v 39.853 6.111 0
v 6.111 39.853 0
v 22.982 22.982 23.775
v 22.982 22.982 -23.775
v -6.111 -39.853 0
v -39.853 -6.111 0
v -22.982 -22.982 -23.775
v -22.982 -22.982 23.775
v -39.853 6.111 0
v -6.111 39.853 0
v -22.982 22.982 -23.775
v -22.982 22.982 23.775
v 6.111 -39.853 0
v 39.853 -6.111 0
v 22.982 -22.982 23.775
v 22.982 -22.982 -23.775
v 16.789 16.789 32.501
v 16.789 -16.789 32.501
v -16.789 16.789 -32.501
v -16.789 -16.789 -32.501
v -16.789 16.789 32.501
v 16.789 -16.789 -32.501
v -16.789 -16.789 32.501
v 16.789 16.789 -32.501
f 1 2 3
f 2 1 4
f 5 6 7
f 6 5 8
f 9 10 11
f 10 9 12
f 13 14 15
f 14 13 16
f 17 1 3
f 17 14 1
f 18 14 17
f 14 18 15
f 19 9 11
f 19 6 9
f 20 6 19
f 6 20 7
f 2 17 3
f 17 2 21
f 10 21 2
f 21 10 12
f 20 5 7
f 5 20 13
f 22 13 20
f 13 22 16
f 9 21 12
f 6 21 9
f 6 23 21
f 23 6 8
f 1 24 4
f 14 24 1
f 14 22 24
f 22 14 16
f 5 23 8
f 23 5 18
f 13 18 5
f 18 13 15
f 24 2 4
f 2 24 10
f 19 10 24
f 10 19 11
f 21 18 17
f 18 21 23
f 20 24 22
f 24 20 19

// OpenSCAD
// file: triangle.scad
function triangle_edge_length(edge_length, depth) =
    edge_length - 2*sqrt(3)*depth;

module triangle(edge_length, depth, thickness) {
    e_top = triangle_edge_length(edge_length, depth);
    r_top = e_top/sqrt(3);
    r_bottom = r_top + thickness * sqrt(3)/2;
    rotate(90)
    for (z=[0,1]) mirror([0,0,z])
    linear_extrude(thickness/2, scale=r_top/r_bottom)
    circle(r=r_bottom, $fn=3);
}
// file: hinge.scad
$fn = 40;

hinge_gap = 0.3;
hinge_hole_d = 2.6;
hinge_rod_d = 1.8;

module hinge_hole_piece(width, depth, thickness) {
    h = width - hinge_gap;
    difference() {
        hinge_rod_piece(width, depth, thickness);
        rotate([0,90,0])
        cylinder(d=hinge_hole_d, h=width+1, center=true);
    }
}

module hinge_rod_piece(width, depth, thickness) {
    h = width - hinge_gap;
    rotate([0,90,0]) {
        cylinder(d=thickness, h=h, center=true);
        translate([-thickness/2,0,-h/2])
        cube([thickness, depth, h]);
    }
}

module hinge_rod(width) {
    h = width - hinge_gap;
    rotate([0,90,0])
    cylinder(d=hinge_rod_d, h=h, center=true);
}

module hinge(width, depth, thickness, n) {
    unit_width = width/n;
    shift = width/2 - unit_width/2;
    for (i=[0:2:n-1]) {
        translate([i*unit_width - shift,0,0])
        hinge_rod_piece(unit_width, depth, thickness);
    }
    for (i=[1:2:n-1]) {
        translate([i*unit_width - shift,0,0])
        rotate(180)
        hinge_hole_piece(unit_width, depth, thickness);
    }
    hinge_rod(width);
}

intersection() {
    translate([0,0,-100])
    cube(200, center=true);
    union() {
        for (y=[-8,8]) translate([0,y,0])
        cube([30, 5, 4], center=true);
        hinge(30, 6, 4, 6);
    }
}
// file: magnet.scad
magnet_width = 5;
magnet_height = 2.5;
magnet_depth = 1.5;
magnet_gap = .4;
magnet_wall = .8;
magnet_cover = .7;

module magnet_hole(p, q, thickness) {
    x = (q-p) / norm(q-p);
    y = [-x[1], x[0]];
    a = -90 + atan2(-x[0], x[1]);
    v = (p+q) / 2;
    width = magnet_width + magnet_gap + 2*magnet_wall;
    depth = magnet_depth + magnet_gap + magnet_wall;
    height = magnet_height + magnet_gap + magnet_cover;
    translate(v)
    rotate(a)
    translate([-width/2, 0.8,  thickness - height + 0.01])
    cube([width, depth, height]);
}

module magnet_holder() {
    width = magnet_width + magnet_gap + 2*magnet_wall;
    depth = magnet_depth + magnet_gap + magnet_wall;
    height = magnet_height + magnet_gap + magnet_cover;
    difference() {
        cube([width, depth, height-.2]);
        translate([magnet_wall, -0.01, magnet_cover])
        cube([width-2*magnet_wall, depth-magnet_wall, height]);
        translate([0,0,5/sqrt(2)+height/2])
        rotate([45,0,0])
        cube([100,5,5], center=true);
    }
}

module magnet_cut_outs(edges, thickness) {
    difference() {
        children();
        translate([0,0,-thickness/2])
        for (edge=edges) magnet_hole(edge[0], edge[1], thickness);
    }
}

/*
A = [-20, 0];
B = [10, 10];
C = [0, -10];
magnet_cut_outs([[A,B],[B,C],[C,A]],4)
linear_extrude(4)
polygon([A, B, C]);
*/

for (x=[1:2])
for (y=[1:6])
translate([10*x,-y*5,0])
magnet_holder();
// file: geometry.scad
module cut_through(a_2d, b_2d) {
    v = b_2d - a_2d;
    intersection() {
        translate(a_2d)
        rotate(atan2(-v[0], v[1]))
        translate([100,0,0])
        cube([200,200,10], center=true);
        children();
    }
}

function along(p, q, ratio) = p + ratio * (q-p);

function triangle_points(edge_length) = 
    let(a = edge_length/2, rho = edge_length*sqrt(3)/6) 
    [[-a,-rho], [a,-rho], [0,2*rho]];

function line_line(a,b, p,q) = 
    along(a, b, cross(a-p,p-q)/cross(a-b,p-q));
// file: hinged_triangle.scad
use <hinge.scad>
use <triangle.scad>

module hinged_triangle(
    edge_length, depth, thickness, hinge_n, flip) {
    for (i=[0,1,2]) {
        rotate(120*i)
        translate([0, -edge_length*sqrt(3)/6, 0])
        rotate(180*flip)
        hinge(
            width=triangle_edge_length(edge_length=edge_length, depth=depth), 
            depth=depth, 
            thickness=thickness, 
            n=hinge_n);
    }
    triangle(
        edge_length=edge_length, 
        depth=depth, 
        thickness=thickness);
}
// file: dovetail.scad
dovetail_tension = 0.08;
dovetail_shape = 0.4;
dovetail_depth = 3;
dovetail_lower_cover = 0.4;
dovetail_upper_cover = 0.6;

function shift(pt, vec) = [for (p = vec) p + pt];

function zig(start_x, width) =
    let(
        a = width/4, 
        d = -dovetail_depth,
        s = dovetail_depth * dovetail_shape / 2
    )
    shift(
        [start_x, dovetail_tension],
        [[0,0],[a+s, 0],[a-s, d],[3*a+s, d],[3*a-s, 0]]
    );

function zag(start_x, width) =
    let(
        a = width/4, 
        d = -dovetail_depth,
        s = dovetail_depth * dovetail_shape / 2
    )
    shift(
        [start_x, dovetail_tension],
        [[0,d],[a+s, d],[a-s, 0],[3*a+s, 0],[3*a-s, d]]
    );

function zigzag(start_x, width, zig_or_zag) =
    zig_or_zag ? zig(start_x, width) : zag(start_x, width);

module dovetail(width, n, thickness, zig_or_zag) {
    h = thickness - dovetail_upper_cover;
    unit = width / n;
    translate([-width/2, dovetail_depth/2, -thickness/2]) {
        linear_extrude(h)
        polygon(
            [for (i=[0:n-1]) 
                each(zigzag(unit*i, unit, zig_or_zag)),
             [width, 0], [width, width], [0,width]]);
        translate([0, -dovetail_depth, -10])
        cube([width, width + dovetail_depth, dovetail_lower_cover + 10]);
        translate([0,0,h])
        cube([width, width, dovetail_upper_cover + 10]);
    }
}

intersection_for (y=[0,1]) mirror([0,y,0])
translate([0,8,0])
rotate([180,0,0])
dovetail(100, 10, 4);
// main file
use <dovetail.scad>
use <hinged_triangle.scad>
use <geometry.scad>
use <magnet.scad>

$fn = 40;

thickness = 4;
depth = 5;
edge_length = 85;

dovetail_n = 24;
hinge_n = 12;

assert(dovetail_n%4==0);

pts = triangle_points(edge_length);

module face() {
    intersection() {
        hinged_triangle(
            edge_length=edge_length, 
            depth=depth, 
            thickness=thickness,
            hinge_n=hinge_n,
            flip=0);
        linear_extrude(2*thickness, center=true) polygon(pts);
    }
}

module outer_face() {
    intersection() {
        hinged_triangle(
            edge_length=edge_length, 
            depth=depth, 
            thickness=thickness,
            hinge_n=hinge_n,
            flip=1);
        linear_extrude(2*thickness, center=true) polygon(pts);
    }
}

/*
Ear and slot

module ear(p) {
    union() {
        translate(p) {
            cylinder(d1=8,d2=6,h=w/2);
            mirror([0,0,1])
            cylinder(d1=8,d2=6,h=w/2);
        }
        children();
    }
}

module slot(p) {
    difference() {
        children();
        translate(p) {
            translate([0,0,-0.01])
            cylinder(d1=8.1,d2=6.1,h=w/2+.05);
            mirror([0,0,1])
            translate([0,0,-0.01])
            cylinder(d1=8.1,d2=6.1,h=w/2+0.05);
        }
    }
}

module left(dir, ear_or_slot) {
    conn(a,b,dir)
    conn(e,a,1-dir)
    intersection() {
        edge(a,b,45);
        if (ear_or_slot) {
            ear((2*b+e)/3+[1.6,0,0])
            edge(b,e,0,0.05);
        } else {
            slot((2*b+e)/3-[1.6,0,0])
            edge(b,e,0,0.05);
        }
        edge(e,a,45);
        cube([200,200,w],center=true);
    }
}
module right(dir, ear_or_slot) {
    mirror([1,0,0]) left(dir, ear_or_slot);
}


*/

module faces() {
    face();
    for (a=[120:120:360])
        rotate(a)
        translate([0,-edge_length*sqrt(3)/3,0])
        rotate(180)
        outer_face();
}

module inner_dovetail_piece() {
    translate([0, 2+depth-edge_length*sqrt(3)/6, 0])
    dovetail(
        width=2*edge_length, 
        n=dovetail_n, 
        thickness=thickness,
        zig_or_zag=true);
}

module outer_dovetail_piece(zig_or_zag) {
    translate([0, -edge_length*sqrt(3)/6, 0])
    intersection_for(y=[0,1])
        mirror([0,y,0])
        translate([0, 2+depth, 0])
        rotate([180,0,0])
        dovetail(
            width=2*edge_length, 
            n=dovetail_n, 
            thickness=thickness,
            zig_or_zag=zig_or_zag);
}

module all_inner_dovetails() {
    intersection_for(a=[120:120:360]) 
        rotate(a) inner_dovetail_piece();
}

module all_outer_dovetails() {
    for(a=[120:120:360])
        rotate(a) {
            translate([0,edge_length*sqrt(3)/2,0])
            outer_dovetail_piece(zig_or_zag=false);
            outer_dovetail_piece(zig_or_zag=false);
        }
}

module inner() {
    intersection() {
        all_inner_dovetails();
        children();
    }
    // Magnet size: 5x2.5x1.5
}

module outer() {
    intersection() {
        all_outer_dovetails();
        children();
    }
}

A = pts[0];
B = pts[1];
C = pts[2];
F = along(A,B,.5);
G = along(B,C,1/3);
H = along(B,C,2/3);
E = along(A,C,.5);

W = A+(B-C);
T = B+(C-A);
Y = along(C,T,-.5);
I = along(C,T,.5);
X = along(B,T,.5);
J = along(B,W,.5);
U = along(A,W,1/3);
V = along(A,W,2/3);
Z = along(A,W,-1/3);

S = line_line(B,I, F,T);
N = line_line(C,X, A,H);
K = line_line(C,F, A,H);
M = line_line(B,E, F,G);
Q = line_line(F,G, A,J);
R = line_line(B,V, A,J);
L = line_line(A,Y, C,Z);

TL = line_line(A,Y, B,E);
BC = line_line(C,F, A,J);
MC = line_line(C,F, B,E);

module keep(vec) {
    intersection() {
        linear_extrude(2*thickness, center=true)
        polygon(vec);
        children();
    }
}

module piece_1a() { cut_through(F,G) face(); }
module piece_1b() { cut_through(H,A) face(); }
module piece_1c() { cut_through(A,H) cut_through(G,F) face(); }

module piece_2a() { cut_through(F,C) face(); }
module piece_2b() { cut_through(C,F) face(); }

module inner_face_1() {
    translate([2,0,0]) inner() piece_1a();
    translate([0,2,0]) inner() piece_1b();
    inner() piece_1c();
}

module inner_face_2() {
    translate([2,0,0]) inner() piece_2a();
    translate([-2,0,0]) inner() piece_2b();
}

module conn_a() {
    keep([K,M,S,N]) outer() faces();
}

module conn_b() {
    keep([B,S,F,BC]) outer() faces();
}

module conn_c() {
    keep([A,BC,F,M,MC]) outer() faces();
}

module conn_d() {
    keep([A,MC,C,L]) outer() faces();
}

module face_pair() {
    inner_face_2();
    translate([0,-40,0])
    rotate(180)
    inner_face_1();
}

module plane(radius) {
    cube([100,100,2*radius],center=true);
}

module support() {
    intersection() {
        rho=edge_length/sqrt(6) - thickness/2 - 0.2;

        plane(rho);
        intersection_for(a=[90:90:360])
        rotate(a+45)
        rotate([90,0,0])
        plane(rho);
        intersection_for(a=[90:90:360])
        rotate(a)
        rotate([109.28/2,0,0])
        plane(rho);
    }
}

support();
